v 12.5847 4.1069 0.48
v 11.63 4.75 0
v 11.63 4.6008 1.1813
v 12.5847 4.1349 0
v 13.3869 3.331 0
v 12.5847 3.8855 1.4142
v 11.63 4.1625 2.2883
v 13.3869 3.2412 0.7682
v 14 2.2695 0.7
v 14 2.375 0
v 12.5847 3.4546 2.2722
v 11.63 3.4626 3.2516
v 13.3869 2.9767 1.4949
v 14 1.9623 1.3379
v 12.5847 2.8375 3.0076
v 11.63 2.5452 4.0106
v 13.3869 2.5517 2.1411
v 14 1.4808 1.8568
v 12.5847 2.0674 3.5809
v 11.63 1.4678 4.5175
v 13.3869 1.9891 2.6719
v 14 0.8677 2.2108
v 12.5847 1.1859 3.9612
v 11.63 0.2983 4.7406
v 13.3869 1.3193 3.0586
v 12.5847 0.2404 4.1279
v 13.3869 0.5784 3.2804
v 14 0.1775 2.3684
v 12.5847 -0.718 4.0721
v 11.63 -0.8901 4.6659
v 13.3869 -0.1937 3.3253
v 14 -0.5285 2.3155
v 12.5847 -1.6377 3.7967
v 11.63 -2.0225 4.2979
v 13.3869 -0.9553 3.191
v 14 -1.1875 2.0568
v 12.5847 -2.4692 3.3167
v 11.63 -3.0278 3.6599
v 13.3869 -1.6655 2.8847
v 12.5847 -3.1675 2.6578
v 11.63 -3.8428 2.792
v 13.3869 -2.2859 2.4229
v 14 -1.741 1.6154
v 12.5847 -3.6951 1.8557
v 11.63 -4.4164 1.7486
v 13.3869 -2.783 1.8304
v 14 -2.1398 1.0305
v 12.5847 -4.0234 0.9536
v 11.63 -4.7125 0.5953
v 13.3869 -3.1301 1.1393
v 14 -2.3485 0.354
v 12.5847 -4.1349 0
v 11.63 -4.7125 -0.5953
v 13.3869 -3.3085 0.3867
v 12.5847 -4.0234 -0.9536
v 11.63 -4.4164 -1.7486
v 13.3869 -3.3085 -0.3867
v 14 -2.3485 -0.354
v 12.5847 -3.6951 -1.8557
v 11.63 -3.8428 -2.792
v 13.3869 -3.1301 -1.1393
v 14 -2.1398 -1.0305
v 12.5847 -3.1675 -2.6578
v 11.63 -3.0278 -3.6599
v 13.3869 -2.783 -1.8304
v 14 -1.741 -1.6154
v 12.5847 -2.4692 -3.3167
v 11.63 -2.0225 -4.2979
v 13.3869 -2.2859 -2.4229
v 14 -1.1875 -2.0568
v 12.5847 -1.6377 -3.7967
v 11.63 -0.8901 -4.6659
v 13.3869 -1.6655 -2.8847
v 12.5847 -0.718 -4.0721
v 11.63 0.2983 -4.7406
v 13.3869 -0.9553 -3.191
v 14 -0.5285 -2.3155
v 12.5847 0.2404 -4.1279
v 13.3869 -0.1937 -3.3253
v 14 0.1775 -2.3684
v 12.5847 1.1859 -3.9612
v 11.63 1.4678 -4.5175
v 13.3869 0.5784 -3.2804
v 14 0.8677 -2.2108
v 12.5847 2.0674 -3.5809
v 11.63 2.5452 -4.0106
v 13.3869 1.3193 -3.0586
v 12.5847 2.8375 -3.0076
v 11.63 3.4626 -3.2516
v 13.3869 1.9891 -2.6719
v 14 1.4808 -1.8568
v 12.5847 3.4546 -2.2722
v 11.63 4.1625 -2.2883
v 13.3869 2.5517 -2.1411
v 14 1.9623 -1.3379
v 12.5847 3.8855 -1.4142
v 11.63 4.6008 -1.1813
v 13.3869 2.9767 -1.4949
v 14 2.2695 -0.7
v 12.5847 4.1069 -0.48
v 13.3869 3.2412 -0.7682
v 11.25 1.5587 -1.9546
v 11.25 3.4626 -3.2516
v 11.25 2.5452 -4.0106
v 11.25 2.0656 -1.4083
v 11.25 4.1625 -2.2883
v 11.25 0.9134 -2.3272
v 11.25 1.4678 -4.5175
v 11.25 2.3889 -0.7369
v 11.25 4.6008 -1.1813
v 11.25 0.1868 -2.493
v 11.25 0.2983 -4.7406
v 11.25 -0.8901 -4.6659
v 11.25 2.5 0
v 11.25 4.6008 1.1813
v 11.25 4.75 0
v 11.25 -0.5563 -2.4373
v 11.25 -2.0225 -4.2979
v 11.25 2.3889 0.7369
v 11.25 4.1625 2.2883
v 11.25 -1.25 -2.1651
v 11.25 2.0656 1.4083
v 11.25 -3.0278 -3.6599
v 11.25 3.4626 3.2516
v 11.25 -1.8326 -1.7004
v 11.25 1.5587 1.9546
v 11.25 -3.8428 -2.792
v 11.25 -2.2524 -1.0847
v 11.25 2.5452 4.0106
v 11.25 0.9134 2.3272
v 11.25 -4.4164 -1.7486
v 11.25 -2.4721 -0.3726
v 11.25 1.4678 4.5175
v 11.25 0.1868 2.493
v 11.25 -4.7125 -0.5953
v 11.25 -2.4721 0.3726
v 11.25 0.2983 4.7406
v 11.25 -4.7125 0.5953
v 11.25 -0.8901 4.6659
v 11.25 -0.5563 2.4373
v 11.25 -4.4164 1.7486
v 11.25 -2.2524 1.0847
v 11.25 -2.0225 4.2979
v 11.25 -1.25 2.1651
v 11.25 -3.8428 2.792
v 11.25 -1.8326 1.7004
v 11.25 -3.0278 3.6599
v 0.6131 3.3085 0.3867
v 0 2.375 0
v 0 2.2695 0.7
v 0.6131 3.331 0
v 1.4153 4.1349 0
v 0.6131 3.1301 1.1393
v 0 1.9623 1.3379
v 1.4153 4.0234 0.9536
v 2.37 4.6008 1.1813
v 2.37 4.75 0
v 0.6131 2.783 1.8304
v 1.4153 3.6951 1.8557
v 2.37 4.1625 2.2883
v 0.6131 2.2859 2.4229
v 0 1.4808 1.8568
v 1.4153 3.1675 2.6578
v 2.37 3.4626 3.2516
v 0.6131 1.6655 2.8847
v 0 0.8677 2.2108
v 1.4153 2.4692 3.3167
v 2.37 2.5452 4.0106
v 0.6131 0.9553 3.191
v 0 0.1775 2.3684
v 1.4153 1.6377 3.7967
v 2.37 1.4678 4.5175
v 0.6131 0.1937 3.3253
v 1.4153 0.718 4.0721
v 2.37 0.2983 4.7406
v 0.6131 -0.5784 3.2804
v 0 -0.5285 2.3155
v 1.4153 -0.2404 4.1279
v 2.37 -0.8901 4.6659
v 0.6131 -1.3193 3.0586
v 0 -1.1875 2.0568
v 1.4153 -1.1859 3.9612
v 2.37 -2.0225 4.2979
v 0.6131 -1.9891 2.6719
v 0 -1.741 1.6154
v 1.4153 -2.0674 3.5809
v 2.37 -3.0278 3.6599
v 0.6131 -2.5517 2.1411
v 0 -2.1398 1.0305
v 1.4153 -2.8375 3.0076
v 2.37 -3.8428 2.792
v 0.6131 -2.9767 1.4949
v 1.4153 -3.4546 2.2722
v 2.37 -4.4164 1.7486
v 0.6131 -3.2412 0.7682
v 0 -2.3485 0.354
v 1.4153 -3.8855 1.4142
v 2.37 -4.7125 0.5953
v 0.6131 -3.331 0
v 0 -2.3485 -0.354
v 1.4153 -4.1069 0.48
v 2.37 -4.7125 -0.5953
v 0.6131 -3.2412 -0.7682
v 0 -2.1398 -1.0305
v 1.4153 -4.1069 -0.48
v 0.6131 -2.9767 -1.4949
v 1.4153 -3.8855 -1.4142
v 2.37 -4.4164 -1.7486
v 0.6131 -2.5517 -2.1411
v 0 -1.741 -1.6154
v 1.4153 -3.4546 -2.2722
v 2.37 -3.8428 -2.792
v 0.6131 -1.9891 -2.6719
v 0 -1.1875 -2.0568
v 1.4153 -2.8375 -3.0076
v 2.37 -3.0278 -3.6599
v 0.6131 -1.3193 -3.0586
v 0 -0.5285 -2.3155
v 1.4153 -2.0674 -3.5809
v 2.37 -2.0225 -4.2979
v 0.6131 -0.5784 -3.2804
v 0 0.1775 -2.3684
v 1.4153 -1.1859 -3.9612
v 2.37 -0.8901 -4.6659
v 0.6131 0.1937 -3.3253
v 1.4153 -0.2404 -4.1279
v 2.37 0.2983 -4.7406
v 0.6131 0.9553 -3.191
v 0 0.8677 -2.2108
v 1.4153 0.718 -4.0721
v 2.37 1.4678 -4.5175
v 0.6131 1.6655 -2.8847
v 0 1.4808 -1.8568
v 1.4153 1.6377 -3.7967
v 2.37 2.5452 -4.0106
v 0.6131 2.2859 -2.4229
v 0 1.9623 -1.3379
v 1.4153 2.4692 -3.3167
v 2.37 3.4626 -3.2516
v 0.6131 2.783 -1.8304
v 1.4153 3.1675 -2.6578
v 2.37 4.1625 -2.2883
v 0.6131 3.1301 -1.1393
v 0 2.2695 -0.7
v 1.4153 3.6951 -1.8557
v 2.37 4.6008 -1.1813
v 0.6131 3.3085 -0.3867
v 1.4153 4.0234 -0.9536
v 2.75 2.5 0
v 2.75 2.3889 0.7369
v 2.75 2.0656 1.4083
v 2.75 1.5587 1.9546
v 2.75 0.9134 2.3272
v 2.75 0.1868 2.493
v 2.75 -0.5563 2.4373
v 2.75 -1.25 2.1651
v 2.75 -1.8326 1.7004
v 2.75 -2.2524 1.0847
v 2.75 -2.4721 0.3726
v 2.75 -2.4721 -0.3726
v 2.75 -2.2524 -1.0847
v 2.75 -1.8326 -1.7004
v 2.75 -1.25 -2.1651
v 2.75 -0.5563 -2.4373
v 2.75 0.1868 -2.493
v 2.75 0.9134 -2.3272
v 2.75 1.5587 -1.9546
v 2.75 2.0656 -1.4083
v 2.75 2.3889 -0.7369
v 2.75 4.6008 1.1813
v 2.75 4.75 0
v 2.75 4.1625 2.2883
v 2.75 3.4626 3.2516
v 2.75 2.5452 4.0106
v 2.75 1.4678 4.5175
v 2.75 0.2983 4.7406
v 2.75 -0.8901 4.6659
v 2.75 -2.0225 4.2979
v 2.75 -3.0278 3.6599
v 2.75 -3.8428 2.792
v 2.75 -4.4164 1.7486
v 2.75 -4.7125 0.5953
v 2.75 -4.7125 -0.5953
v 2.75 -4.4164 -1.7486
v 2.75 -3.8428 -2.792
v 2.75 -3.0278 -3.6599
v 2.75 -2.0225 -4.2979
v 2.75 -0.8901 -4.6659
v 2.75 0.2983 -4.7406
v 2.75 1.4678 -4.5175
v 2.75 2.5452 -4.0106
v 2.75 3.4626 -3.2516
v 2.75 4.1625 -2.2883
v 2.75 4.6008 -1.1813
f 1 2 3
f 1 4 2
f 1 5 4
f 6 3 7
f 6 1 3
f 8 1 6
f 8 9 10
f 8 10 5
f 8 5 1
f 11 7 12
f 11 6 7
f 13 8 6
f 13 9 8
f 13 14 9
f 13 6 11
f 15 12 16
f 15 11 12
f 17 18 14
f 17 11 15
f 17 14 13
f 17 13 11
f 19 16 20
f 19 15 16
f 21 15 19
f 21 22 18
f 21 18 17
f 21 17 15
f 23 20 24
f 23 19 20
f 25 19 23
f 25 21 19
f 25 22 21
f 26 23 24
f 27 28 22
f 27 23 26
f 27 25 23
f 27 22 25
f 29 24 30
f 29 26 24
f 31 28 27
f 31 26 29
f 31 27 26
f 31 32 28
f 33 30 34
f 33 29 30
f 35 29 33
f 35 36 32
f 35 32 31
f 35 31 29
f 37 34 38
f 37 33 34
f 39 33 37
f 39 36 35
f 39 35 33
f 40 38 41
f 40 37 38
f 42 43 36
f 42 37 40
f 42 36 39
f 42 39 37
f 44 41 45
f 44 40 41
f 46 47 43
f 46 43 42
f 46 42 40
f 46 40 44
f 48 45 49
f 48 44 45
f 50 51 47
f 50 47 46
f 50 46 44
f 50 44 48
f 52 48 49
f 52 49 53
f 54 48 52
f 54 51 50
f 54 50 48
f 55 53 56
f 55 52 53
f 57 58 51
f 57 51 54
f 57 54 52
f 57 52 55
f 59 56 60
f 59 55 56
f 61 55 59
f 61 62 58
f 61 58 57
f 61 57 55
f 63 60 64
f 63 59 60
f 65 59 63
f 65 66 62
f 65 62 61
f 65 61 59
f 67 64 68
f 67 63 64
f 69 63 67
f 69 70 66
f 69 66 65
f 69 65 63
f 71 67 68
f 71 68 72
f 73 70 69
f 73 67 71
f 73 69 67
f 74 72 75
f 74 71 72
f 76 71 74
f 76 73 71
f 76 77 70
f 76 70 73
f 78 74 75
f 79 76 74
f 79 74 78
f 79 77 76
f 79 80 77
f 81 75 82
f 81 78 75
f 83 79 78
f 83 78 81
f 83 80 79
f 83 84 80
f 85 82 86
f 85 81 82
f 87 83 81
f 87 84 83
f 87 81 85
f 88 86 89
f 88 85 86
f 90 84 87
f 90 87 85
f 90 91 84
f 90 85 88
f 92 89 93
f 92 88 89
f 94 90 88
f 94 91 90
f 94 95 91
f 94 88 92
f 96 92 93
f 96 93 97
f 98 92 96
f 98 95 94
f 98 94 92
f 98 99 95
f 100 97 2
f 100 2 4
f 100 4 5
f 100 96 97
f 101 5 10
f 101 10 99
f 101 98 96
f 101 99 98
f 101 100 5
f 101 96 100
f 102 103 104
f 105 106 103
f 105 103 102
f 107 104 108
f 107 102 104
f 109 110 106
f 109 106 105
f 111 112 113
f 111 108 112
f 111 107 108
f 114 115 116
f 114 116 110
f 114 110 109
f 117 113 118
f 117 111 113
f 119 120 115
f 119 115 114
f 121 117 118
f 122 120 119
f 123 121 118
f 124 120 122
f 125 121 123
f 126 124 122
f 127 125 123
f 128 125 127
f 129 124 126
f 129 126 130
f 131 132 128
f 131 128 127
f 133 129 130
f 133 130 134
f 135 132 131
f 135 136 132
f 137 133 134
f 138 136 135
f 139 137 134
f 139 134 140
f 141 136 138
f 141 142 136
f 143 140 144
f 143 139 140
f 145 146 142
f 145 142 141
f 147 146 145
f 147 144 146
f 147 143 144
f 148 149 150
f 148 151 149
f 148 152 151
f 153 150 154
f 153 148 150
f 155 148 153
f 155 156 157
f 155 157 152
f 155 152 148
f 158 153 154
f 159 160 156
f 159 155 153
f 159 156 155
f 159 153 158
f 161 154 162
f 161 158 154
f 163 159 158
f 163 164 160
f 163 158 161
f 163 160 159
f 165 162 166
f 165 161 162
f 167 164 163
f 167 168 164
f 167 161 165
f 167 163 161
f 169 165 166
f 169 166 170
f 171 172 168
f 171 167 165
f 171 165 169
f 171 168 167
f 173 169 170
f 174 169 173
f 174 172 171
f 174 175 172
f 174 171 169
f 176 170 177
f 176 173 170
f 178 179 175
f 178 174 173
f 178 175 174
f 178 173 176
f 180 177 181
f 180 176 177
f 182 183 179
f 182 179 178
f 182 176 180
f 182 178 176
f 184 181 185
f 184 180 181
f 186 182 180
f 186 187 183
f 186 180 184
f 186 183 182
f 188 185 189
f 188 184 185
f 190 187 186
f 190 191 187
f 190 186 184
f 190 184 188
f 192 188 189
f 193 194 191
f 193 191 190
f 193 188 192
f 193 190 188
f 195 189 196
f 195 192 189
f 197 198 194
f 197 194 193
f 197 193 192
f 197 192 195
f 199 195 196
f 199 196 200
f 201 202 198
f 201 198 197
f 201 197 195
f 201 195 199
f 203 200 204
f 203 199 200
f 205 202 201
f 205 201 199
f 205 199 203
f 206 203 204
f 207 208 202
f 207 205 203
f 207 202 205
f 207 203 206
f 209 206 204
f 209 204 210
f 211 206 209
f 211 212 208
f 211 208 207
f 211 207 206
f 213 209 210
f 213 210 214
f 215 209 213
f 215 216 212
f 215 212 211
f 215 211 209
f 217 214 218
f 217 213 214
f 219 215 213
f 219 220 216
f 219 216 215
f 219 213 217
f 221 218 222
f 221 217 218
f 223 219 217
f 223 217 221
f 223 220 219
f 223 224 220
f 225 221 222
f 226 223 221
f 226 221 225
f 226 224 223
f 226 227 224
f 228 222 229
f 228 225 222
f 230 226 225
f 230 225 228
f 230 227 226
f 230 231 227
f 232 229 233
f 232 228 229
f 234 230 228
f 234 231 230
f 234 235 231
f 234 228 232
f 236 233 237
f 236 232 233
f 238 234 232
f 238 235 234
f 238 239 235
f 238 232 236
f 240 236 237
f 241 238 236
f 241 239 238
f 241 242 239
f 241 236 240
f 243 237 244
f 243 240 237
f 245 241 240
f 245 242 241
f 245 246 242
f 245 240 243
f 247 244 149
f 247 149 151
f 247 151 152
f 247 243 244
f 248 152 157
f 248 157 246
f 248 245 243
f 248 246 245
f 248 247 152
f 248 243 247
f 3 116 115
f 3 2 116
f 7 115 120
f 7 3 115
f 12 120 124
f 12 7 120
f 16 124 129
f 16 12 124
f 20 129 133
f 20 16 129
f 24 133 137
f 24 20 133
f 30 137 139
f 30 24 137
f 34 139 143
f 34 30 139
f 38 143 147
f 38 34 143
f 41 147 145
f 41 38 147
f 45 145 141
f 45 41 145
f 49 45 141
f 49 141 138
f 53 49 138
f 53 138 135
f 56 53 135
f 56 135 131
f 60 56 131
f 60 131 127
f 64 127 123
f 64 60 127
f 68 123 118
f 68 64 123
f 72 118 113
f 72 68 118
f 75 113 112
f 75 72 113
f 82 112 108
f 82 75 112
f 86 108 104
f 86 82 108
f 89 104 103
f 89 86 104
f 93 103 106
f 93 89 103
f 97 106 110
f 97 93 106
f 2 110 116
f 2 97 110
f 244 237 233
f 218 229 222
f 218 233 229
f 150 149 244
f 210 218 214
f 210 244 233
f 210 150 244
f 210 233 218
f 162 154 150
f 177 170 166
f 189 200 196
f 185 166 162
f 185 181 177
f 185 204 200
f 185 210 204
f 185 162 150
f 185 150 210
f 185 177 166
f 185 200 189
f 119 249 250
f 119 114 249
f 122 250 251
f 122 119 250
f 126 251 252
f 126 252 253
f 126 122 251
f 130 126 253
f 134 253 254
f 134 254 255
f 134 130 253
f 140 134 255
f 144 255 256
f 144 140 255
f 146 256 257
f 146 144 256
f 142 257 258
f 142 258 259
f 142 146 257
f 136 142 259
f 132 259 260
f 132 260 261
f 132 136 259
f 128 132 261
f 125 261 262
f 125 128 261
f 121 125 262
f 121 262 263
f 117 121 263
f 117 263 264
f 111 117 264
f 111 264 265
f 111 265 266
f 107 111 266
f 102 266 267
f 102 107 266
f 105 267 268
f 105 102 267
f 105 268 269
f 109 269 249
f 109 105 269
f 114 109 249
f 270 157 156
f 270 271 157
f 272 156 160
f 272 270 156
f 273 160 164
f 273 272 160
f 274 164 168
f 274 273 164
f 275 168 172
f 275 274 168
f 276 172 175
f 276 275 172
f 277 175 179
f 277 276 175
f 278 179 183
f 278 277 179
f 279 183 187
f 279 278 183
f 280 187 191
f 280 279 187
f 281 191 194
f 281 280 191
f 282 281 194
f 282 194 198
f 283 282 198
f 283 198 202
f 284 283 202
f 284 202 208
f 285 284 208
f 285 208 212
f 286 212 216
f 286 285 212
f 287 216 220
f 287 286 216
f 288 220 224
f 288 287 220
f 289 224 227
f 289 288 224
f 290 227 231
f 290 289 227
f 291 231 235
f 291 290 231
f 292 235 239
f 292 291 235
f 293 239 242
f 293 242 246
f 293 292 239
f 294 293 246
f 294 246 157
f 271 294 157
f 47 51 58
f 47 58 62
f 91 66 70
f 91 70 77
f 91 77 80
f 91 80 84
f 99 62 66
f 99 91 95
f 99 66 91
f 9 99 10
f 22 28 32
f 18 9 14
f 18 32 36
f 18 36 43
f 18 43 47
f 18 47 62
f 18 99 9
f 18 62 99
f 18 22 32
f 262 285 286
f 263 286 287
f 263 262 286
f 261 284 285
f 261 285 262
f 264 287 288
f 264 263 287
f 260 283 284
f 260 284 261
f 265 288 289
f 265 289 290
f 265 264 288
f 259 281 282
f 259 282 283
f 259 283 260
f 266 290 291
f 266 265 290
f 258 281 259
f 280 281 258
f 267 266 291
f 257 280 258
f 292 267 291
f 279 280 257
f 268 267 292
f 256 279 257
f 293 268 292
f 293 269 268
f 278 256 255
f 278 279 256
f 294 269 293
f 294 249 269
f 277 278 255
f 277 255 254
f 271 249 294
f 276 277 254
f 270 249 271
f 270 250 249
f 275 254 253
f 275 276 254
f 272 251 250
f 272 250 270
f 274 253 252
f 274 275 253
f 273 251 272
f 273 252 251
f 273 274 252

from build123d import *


with BuildPart() as part:
    # Sketch2 → Revolve1 (revolve)
    with BuildSketch(Plane.XY):
        with BuildLine():
            ThreePointArc((0, 2.375), (0.992680215, 3.754414901), (2.37, 4.75))
            Line((2.37, 4.75), (2.75, 4.75))
            Line((2.75, 4.75), (2.75, 2.5))
            Line((2.75, 2.5), (11.25, 2.5))
            Line((11.25, 2.5), (11.25, 4.75))
            Line((11.25, 4.75), (11.63, 4.75))
            ThreePointArc((11.63, 4.75), (13.007319785, 3.754414901), (14, 2.375))
            Line((14, 2.375), (14, 0))
            Line((14, 0), (0, 0))
            Line((0, 0), (0, 2.375))
        make_face()
    revolve(axis=Axis((-1.178114582, 0, 0), (1, 0, 0)))


solid = part.part
